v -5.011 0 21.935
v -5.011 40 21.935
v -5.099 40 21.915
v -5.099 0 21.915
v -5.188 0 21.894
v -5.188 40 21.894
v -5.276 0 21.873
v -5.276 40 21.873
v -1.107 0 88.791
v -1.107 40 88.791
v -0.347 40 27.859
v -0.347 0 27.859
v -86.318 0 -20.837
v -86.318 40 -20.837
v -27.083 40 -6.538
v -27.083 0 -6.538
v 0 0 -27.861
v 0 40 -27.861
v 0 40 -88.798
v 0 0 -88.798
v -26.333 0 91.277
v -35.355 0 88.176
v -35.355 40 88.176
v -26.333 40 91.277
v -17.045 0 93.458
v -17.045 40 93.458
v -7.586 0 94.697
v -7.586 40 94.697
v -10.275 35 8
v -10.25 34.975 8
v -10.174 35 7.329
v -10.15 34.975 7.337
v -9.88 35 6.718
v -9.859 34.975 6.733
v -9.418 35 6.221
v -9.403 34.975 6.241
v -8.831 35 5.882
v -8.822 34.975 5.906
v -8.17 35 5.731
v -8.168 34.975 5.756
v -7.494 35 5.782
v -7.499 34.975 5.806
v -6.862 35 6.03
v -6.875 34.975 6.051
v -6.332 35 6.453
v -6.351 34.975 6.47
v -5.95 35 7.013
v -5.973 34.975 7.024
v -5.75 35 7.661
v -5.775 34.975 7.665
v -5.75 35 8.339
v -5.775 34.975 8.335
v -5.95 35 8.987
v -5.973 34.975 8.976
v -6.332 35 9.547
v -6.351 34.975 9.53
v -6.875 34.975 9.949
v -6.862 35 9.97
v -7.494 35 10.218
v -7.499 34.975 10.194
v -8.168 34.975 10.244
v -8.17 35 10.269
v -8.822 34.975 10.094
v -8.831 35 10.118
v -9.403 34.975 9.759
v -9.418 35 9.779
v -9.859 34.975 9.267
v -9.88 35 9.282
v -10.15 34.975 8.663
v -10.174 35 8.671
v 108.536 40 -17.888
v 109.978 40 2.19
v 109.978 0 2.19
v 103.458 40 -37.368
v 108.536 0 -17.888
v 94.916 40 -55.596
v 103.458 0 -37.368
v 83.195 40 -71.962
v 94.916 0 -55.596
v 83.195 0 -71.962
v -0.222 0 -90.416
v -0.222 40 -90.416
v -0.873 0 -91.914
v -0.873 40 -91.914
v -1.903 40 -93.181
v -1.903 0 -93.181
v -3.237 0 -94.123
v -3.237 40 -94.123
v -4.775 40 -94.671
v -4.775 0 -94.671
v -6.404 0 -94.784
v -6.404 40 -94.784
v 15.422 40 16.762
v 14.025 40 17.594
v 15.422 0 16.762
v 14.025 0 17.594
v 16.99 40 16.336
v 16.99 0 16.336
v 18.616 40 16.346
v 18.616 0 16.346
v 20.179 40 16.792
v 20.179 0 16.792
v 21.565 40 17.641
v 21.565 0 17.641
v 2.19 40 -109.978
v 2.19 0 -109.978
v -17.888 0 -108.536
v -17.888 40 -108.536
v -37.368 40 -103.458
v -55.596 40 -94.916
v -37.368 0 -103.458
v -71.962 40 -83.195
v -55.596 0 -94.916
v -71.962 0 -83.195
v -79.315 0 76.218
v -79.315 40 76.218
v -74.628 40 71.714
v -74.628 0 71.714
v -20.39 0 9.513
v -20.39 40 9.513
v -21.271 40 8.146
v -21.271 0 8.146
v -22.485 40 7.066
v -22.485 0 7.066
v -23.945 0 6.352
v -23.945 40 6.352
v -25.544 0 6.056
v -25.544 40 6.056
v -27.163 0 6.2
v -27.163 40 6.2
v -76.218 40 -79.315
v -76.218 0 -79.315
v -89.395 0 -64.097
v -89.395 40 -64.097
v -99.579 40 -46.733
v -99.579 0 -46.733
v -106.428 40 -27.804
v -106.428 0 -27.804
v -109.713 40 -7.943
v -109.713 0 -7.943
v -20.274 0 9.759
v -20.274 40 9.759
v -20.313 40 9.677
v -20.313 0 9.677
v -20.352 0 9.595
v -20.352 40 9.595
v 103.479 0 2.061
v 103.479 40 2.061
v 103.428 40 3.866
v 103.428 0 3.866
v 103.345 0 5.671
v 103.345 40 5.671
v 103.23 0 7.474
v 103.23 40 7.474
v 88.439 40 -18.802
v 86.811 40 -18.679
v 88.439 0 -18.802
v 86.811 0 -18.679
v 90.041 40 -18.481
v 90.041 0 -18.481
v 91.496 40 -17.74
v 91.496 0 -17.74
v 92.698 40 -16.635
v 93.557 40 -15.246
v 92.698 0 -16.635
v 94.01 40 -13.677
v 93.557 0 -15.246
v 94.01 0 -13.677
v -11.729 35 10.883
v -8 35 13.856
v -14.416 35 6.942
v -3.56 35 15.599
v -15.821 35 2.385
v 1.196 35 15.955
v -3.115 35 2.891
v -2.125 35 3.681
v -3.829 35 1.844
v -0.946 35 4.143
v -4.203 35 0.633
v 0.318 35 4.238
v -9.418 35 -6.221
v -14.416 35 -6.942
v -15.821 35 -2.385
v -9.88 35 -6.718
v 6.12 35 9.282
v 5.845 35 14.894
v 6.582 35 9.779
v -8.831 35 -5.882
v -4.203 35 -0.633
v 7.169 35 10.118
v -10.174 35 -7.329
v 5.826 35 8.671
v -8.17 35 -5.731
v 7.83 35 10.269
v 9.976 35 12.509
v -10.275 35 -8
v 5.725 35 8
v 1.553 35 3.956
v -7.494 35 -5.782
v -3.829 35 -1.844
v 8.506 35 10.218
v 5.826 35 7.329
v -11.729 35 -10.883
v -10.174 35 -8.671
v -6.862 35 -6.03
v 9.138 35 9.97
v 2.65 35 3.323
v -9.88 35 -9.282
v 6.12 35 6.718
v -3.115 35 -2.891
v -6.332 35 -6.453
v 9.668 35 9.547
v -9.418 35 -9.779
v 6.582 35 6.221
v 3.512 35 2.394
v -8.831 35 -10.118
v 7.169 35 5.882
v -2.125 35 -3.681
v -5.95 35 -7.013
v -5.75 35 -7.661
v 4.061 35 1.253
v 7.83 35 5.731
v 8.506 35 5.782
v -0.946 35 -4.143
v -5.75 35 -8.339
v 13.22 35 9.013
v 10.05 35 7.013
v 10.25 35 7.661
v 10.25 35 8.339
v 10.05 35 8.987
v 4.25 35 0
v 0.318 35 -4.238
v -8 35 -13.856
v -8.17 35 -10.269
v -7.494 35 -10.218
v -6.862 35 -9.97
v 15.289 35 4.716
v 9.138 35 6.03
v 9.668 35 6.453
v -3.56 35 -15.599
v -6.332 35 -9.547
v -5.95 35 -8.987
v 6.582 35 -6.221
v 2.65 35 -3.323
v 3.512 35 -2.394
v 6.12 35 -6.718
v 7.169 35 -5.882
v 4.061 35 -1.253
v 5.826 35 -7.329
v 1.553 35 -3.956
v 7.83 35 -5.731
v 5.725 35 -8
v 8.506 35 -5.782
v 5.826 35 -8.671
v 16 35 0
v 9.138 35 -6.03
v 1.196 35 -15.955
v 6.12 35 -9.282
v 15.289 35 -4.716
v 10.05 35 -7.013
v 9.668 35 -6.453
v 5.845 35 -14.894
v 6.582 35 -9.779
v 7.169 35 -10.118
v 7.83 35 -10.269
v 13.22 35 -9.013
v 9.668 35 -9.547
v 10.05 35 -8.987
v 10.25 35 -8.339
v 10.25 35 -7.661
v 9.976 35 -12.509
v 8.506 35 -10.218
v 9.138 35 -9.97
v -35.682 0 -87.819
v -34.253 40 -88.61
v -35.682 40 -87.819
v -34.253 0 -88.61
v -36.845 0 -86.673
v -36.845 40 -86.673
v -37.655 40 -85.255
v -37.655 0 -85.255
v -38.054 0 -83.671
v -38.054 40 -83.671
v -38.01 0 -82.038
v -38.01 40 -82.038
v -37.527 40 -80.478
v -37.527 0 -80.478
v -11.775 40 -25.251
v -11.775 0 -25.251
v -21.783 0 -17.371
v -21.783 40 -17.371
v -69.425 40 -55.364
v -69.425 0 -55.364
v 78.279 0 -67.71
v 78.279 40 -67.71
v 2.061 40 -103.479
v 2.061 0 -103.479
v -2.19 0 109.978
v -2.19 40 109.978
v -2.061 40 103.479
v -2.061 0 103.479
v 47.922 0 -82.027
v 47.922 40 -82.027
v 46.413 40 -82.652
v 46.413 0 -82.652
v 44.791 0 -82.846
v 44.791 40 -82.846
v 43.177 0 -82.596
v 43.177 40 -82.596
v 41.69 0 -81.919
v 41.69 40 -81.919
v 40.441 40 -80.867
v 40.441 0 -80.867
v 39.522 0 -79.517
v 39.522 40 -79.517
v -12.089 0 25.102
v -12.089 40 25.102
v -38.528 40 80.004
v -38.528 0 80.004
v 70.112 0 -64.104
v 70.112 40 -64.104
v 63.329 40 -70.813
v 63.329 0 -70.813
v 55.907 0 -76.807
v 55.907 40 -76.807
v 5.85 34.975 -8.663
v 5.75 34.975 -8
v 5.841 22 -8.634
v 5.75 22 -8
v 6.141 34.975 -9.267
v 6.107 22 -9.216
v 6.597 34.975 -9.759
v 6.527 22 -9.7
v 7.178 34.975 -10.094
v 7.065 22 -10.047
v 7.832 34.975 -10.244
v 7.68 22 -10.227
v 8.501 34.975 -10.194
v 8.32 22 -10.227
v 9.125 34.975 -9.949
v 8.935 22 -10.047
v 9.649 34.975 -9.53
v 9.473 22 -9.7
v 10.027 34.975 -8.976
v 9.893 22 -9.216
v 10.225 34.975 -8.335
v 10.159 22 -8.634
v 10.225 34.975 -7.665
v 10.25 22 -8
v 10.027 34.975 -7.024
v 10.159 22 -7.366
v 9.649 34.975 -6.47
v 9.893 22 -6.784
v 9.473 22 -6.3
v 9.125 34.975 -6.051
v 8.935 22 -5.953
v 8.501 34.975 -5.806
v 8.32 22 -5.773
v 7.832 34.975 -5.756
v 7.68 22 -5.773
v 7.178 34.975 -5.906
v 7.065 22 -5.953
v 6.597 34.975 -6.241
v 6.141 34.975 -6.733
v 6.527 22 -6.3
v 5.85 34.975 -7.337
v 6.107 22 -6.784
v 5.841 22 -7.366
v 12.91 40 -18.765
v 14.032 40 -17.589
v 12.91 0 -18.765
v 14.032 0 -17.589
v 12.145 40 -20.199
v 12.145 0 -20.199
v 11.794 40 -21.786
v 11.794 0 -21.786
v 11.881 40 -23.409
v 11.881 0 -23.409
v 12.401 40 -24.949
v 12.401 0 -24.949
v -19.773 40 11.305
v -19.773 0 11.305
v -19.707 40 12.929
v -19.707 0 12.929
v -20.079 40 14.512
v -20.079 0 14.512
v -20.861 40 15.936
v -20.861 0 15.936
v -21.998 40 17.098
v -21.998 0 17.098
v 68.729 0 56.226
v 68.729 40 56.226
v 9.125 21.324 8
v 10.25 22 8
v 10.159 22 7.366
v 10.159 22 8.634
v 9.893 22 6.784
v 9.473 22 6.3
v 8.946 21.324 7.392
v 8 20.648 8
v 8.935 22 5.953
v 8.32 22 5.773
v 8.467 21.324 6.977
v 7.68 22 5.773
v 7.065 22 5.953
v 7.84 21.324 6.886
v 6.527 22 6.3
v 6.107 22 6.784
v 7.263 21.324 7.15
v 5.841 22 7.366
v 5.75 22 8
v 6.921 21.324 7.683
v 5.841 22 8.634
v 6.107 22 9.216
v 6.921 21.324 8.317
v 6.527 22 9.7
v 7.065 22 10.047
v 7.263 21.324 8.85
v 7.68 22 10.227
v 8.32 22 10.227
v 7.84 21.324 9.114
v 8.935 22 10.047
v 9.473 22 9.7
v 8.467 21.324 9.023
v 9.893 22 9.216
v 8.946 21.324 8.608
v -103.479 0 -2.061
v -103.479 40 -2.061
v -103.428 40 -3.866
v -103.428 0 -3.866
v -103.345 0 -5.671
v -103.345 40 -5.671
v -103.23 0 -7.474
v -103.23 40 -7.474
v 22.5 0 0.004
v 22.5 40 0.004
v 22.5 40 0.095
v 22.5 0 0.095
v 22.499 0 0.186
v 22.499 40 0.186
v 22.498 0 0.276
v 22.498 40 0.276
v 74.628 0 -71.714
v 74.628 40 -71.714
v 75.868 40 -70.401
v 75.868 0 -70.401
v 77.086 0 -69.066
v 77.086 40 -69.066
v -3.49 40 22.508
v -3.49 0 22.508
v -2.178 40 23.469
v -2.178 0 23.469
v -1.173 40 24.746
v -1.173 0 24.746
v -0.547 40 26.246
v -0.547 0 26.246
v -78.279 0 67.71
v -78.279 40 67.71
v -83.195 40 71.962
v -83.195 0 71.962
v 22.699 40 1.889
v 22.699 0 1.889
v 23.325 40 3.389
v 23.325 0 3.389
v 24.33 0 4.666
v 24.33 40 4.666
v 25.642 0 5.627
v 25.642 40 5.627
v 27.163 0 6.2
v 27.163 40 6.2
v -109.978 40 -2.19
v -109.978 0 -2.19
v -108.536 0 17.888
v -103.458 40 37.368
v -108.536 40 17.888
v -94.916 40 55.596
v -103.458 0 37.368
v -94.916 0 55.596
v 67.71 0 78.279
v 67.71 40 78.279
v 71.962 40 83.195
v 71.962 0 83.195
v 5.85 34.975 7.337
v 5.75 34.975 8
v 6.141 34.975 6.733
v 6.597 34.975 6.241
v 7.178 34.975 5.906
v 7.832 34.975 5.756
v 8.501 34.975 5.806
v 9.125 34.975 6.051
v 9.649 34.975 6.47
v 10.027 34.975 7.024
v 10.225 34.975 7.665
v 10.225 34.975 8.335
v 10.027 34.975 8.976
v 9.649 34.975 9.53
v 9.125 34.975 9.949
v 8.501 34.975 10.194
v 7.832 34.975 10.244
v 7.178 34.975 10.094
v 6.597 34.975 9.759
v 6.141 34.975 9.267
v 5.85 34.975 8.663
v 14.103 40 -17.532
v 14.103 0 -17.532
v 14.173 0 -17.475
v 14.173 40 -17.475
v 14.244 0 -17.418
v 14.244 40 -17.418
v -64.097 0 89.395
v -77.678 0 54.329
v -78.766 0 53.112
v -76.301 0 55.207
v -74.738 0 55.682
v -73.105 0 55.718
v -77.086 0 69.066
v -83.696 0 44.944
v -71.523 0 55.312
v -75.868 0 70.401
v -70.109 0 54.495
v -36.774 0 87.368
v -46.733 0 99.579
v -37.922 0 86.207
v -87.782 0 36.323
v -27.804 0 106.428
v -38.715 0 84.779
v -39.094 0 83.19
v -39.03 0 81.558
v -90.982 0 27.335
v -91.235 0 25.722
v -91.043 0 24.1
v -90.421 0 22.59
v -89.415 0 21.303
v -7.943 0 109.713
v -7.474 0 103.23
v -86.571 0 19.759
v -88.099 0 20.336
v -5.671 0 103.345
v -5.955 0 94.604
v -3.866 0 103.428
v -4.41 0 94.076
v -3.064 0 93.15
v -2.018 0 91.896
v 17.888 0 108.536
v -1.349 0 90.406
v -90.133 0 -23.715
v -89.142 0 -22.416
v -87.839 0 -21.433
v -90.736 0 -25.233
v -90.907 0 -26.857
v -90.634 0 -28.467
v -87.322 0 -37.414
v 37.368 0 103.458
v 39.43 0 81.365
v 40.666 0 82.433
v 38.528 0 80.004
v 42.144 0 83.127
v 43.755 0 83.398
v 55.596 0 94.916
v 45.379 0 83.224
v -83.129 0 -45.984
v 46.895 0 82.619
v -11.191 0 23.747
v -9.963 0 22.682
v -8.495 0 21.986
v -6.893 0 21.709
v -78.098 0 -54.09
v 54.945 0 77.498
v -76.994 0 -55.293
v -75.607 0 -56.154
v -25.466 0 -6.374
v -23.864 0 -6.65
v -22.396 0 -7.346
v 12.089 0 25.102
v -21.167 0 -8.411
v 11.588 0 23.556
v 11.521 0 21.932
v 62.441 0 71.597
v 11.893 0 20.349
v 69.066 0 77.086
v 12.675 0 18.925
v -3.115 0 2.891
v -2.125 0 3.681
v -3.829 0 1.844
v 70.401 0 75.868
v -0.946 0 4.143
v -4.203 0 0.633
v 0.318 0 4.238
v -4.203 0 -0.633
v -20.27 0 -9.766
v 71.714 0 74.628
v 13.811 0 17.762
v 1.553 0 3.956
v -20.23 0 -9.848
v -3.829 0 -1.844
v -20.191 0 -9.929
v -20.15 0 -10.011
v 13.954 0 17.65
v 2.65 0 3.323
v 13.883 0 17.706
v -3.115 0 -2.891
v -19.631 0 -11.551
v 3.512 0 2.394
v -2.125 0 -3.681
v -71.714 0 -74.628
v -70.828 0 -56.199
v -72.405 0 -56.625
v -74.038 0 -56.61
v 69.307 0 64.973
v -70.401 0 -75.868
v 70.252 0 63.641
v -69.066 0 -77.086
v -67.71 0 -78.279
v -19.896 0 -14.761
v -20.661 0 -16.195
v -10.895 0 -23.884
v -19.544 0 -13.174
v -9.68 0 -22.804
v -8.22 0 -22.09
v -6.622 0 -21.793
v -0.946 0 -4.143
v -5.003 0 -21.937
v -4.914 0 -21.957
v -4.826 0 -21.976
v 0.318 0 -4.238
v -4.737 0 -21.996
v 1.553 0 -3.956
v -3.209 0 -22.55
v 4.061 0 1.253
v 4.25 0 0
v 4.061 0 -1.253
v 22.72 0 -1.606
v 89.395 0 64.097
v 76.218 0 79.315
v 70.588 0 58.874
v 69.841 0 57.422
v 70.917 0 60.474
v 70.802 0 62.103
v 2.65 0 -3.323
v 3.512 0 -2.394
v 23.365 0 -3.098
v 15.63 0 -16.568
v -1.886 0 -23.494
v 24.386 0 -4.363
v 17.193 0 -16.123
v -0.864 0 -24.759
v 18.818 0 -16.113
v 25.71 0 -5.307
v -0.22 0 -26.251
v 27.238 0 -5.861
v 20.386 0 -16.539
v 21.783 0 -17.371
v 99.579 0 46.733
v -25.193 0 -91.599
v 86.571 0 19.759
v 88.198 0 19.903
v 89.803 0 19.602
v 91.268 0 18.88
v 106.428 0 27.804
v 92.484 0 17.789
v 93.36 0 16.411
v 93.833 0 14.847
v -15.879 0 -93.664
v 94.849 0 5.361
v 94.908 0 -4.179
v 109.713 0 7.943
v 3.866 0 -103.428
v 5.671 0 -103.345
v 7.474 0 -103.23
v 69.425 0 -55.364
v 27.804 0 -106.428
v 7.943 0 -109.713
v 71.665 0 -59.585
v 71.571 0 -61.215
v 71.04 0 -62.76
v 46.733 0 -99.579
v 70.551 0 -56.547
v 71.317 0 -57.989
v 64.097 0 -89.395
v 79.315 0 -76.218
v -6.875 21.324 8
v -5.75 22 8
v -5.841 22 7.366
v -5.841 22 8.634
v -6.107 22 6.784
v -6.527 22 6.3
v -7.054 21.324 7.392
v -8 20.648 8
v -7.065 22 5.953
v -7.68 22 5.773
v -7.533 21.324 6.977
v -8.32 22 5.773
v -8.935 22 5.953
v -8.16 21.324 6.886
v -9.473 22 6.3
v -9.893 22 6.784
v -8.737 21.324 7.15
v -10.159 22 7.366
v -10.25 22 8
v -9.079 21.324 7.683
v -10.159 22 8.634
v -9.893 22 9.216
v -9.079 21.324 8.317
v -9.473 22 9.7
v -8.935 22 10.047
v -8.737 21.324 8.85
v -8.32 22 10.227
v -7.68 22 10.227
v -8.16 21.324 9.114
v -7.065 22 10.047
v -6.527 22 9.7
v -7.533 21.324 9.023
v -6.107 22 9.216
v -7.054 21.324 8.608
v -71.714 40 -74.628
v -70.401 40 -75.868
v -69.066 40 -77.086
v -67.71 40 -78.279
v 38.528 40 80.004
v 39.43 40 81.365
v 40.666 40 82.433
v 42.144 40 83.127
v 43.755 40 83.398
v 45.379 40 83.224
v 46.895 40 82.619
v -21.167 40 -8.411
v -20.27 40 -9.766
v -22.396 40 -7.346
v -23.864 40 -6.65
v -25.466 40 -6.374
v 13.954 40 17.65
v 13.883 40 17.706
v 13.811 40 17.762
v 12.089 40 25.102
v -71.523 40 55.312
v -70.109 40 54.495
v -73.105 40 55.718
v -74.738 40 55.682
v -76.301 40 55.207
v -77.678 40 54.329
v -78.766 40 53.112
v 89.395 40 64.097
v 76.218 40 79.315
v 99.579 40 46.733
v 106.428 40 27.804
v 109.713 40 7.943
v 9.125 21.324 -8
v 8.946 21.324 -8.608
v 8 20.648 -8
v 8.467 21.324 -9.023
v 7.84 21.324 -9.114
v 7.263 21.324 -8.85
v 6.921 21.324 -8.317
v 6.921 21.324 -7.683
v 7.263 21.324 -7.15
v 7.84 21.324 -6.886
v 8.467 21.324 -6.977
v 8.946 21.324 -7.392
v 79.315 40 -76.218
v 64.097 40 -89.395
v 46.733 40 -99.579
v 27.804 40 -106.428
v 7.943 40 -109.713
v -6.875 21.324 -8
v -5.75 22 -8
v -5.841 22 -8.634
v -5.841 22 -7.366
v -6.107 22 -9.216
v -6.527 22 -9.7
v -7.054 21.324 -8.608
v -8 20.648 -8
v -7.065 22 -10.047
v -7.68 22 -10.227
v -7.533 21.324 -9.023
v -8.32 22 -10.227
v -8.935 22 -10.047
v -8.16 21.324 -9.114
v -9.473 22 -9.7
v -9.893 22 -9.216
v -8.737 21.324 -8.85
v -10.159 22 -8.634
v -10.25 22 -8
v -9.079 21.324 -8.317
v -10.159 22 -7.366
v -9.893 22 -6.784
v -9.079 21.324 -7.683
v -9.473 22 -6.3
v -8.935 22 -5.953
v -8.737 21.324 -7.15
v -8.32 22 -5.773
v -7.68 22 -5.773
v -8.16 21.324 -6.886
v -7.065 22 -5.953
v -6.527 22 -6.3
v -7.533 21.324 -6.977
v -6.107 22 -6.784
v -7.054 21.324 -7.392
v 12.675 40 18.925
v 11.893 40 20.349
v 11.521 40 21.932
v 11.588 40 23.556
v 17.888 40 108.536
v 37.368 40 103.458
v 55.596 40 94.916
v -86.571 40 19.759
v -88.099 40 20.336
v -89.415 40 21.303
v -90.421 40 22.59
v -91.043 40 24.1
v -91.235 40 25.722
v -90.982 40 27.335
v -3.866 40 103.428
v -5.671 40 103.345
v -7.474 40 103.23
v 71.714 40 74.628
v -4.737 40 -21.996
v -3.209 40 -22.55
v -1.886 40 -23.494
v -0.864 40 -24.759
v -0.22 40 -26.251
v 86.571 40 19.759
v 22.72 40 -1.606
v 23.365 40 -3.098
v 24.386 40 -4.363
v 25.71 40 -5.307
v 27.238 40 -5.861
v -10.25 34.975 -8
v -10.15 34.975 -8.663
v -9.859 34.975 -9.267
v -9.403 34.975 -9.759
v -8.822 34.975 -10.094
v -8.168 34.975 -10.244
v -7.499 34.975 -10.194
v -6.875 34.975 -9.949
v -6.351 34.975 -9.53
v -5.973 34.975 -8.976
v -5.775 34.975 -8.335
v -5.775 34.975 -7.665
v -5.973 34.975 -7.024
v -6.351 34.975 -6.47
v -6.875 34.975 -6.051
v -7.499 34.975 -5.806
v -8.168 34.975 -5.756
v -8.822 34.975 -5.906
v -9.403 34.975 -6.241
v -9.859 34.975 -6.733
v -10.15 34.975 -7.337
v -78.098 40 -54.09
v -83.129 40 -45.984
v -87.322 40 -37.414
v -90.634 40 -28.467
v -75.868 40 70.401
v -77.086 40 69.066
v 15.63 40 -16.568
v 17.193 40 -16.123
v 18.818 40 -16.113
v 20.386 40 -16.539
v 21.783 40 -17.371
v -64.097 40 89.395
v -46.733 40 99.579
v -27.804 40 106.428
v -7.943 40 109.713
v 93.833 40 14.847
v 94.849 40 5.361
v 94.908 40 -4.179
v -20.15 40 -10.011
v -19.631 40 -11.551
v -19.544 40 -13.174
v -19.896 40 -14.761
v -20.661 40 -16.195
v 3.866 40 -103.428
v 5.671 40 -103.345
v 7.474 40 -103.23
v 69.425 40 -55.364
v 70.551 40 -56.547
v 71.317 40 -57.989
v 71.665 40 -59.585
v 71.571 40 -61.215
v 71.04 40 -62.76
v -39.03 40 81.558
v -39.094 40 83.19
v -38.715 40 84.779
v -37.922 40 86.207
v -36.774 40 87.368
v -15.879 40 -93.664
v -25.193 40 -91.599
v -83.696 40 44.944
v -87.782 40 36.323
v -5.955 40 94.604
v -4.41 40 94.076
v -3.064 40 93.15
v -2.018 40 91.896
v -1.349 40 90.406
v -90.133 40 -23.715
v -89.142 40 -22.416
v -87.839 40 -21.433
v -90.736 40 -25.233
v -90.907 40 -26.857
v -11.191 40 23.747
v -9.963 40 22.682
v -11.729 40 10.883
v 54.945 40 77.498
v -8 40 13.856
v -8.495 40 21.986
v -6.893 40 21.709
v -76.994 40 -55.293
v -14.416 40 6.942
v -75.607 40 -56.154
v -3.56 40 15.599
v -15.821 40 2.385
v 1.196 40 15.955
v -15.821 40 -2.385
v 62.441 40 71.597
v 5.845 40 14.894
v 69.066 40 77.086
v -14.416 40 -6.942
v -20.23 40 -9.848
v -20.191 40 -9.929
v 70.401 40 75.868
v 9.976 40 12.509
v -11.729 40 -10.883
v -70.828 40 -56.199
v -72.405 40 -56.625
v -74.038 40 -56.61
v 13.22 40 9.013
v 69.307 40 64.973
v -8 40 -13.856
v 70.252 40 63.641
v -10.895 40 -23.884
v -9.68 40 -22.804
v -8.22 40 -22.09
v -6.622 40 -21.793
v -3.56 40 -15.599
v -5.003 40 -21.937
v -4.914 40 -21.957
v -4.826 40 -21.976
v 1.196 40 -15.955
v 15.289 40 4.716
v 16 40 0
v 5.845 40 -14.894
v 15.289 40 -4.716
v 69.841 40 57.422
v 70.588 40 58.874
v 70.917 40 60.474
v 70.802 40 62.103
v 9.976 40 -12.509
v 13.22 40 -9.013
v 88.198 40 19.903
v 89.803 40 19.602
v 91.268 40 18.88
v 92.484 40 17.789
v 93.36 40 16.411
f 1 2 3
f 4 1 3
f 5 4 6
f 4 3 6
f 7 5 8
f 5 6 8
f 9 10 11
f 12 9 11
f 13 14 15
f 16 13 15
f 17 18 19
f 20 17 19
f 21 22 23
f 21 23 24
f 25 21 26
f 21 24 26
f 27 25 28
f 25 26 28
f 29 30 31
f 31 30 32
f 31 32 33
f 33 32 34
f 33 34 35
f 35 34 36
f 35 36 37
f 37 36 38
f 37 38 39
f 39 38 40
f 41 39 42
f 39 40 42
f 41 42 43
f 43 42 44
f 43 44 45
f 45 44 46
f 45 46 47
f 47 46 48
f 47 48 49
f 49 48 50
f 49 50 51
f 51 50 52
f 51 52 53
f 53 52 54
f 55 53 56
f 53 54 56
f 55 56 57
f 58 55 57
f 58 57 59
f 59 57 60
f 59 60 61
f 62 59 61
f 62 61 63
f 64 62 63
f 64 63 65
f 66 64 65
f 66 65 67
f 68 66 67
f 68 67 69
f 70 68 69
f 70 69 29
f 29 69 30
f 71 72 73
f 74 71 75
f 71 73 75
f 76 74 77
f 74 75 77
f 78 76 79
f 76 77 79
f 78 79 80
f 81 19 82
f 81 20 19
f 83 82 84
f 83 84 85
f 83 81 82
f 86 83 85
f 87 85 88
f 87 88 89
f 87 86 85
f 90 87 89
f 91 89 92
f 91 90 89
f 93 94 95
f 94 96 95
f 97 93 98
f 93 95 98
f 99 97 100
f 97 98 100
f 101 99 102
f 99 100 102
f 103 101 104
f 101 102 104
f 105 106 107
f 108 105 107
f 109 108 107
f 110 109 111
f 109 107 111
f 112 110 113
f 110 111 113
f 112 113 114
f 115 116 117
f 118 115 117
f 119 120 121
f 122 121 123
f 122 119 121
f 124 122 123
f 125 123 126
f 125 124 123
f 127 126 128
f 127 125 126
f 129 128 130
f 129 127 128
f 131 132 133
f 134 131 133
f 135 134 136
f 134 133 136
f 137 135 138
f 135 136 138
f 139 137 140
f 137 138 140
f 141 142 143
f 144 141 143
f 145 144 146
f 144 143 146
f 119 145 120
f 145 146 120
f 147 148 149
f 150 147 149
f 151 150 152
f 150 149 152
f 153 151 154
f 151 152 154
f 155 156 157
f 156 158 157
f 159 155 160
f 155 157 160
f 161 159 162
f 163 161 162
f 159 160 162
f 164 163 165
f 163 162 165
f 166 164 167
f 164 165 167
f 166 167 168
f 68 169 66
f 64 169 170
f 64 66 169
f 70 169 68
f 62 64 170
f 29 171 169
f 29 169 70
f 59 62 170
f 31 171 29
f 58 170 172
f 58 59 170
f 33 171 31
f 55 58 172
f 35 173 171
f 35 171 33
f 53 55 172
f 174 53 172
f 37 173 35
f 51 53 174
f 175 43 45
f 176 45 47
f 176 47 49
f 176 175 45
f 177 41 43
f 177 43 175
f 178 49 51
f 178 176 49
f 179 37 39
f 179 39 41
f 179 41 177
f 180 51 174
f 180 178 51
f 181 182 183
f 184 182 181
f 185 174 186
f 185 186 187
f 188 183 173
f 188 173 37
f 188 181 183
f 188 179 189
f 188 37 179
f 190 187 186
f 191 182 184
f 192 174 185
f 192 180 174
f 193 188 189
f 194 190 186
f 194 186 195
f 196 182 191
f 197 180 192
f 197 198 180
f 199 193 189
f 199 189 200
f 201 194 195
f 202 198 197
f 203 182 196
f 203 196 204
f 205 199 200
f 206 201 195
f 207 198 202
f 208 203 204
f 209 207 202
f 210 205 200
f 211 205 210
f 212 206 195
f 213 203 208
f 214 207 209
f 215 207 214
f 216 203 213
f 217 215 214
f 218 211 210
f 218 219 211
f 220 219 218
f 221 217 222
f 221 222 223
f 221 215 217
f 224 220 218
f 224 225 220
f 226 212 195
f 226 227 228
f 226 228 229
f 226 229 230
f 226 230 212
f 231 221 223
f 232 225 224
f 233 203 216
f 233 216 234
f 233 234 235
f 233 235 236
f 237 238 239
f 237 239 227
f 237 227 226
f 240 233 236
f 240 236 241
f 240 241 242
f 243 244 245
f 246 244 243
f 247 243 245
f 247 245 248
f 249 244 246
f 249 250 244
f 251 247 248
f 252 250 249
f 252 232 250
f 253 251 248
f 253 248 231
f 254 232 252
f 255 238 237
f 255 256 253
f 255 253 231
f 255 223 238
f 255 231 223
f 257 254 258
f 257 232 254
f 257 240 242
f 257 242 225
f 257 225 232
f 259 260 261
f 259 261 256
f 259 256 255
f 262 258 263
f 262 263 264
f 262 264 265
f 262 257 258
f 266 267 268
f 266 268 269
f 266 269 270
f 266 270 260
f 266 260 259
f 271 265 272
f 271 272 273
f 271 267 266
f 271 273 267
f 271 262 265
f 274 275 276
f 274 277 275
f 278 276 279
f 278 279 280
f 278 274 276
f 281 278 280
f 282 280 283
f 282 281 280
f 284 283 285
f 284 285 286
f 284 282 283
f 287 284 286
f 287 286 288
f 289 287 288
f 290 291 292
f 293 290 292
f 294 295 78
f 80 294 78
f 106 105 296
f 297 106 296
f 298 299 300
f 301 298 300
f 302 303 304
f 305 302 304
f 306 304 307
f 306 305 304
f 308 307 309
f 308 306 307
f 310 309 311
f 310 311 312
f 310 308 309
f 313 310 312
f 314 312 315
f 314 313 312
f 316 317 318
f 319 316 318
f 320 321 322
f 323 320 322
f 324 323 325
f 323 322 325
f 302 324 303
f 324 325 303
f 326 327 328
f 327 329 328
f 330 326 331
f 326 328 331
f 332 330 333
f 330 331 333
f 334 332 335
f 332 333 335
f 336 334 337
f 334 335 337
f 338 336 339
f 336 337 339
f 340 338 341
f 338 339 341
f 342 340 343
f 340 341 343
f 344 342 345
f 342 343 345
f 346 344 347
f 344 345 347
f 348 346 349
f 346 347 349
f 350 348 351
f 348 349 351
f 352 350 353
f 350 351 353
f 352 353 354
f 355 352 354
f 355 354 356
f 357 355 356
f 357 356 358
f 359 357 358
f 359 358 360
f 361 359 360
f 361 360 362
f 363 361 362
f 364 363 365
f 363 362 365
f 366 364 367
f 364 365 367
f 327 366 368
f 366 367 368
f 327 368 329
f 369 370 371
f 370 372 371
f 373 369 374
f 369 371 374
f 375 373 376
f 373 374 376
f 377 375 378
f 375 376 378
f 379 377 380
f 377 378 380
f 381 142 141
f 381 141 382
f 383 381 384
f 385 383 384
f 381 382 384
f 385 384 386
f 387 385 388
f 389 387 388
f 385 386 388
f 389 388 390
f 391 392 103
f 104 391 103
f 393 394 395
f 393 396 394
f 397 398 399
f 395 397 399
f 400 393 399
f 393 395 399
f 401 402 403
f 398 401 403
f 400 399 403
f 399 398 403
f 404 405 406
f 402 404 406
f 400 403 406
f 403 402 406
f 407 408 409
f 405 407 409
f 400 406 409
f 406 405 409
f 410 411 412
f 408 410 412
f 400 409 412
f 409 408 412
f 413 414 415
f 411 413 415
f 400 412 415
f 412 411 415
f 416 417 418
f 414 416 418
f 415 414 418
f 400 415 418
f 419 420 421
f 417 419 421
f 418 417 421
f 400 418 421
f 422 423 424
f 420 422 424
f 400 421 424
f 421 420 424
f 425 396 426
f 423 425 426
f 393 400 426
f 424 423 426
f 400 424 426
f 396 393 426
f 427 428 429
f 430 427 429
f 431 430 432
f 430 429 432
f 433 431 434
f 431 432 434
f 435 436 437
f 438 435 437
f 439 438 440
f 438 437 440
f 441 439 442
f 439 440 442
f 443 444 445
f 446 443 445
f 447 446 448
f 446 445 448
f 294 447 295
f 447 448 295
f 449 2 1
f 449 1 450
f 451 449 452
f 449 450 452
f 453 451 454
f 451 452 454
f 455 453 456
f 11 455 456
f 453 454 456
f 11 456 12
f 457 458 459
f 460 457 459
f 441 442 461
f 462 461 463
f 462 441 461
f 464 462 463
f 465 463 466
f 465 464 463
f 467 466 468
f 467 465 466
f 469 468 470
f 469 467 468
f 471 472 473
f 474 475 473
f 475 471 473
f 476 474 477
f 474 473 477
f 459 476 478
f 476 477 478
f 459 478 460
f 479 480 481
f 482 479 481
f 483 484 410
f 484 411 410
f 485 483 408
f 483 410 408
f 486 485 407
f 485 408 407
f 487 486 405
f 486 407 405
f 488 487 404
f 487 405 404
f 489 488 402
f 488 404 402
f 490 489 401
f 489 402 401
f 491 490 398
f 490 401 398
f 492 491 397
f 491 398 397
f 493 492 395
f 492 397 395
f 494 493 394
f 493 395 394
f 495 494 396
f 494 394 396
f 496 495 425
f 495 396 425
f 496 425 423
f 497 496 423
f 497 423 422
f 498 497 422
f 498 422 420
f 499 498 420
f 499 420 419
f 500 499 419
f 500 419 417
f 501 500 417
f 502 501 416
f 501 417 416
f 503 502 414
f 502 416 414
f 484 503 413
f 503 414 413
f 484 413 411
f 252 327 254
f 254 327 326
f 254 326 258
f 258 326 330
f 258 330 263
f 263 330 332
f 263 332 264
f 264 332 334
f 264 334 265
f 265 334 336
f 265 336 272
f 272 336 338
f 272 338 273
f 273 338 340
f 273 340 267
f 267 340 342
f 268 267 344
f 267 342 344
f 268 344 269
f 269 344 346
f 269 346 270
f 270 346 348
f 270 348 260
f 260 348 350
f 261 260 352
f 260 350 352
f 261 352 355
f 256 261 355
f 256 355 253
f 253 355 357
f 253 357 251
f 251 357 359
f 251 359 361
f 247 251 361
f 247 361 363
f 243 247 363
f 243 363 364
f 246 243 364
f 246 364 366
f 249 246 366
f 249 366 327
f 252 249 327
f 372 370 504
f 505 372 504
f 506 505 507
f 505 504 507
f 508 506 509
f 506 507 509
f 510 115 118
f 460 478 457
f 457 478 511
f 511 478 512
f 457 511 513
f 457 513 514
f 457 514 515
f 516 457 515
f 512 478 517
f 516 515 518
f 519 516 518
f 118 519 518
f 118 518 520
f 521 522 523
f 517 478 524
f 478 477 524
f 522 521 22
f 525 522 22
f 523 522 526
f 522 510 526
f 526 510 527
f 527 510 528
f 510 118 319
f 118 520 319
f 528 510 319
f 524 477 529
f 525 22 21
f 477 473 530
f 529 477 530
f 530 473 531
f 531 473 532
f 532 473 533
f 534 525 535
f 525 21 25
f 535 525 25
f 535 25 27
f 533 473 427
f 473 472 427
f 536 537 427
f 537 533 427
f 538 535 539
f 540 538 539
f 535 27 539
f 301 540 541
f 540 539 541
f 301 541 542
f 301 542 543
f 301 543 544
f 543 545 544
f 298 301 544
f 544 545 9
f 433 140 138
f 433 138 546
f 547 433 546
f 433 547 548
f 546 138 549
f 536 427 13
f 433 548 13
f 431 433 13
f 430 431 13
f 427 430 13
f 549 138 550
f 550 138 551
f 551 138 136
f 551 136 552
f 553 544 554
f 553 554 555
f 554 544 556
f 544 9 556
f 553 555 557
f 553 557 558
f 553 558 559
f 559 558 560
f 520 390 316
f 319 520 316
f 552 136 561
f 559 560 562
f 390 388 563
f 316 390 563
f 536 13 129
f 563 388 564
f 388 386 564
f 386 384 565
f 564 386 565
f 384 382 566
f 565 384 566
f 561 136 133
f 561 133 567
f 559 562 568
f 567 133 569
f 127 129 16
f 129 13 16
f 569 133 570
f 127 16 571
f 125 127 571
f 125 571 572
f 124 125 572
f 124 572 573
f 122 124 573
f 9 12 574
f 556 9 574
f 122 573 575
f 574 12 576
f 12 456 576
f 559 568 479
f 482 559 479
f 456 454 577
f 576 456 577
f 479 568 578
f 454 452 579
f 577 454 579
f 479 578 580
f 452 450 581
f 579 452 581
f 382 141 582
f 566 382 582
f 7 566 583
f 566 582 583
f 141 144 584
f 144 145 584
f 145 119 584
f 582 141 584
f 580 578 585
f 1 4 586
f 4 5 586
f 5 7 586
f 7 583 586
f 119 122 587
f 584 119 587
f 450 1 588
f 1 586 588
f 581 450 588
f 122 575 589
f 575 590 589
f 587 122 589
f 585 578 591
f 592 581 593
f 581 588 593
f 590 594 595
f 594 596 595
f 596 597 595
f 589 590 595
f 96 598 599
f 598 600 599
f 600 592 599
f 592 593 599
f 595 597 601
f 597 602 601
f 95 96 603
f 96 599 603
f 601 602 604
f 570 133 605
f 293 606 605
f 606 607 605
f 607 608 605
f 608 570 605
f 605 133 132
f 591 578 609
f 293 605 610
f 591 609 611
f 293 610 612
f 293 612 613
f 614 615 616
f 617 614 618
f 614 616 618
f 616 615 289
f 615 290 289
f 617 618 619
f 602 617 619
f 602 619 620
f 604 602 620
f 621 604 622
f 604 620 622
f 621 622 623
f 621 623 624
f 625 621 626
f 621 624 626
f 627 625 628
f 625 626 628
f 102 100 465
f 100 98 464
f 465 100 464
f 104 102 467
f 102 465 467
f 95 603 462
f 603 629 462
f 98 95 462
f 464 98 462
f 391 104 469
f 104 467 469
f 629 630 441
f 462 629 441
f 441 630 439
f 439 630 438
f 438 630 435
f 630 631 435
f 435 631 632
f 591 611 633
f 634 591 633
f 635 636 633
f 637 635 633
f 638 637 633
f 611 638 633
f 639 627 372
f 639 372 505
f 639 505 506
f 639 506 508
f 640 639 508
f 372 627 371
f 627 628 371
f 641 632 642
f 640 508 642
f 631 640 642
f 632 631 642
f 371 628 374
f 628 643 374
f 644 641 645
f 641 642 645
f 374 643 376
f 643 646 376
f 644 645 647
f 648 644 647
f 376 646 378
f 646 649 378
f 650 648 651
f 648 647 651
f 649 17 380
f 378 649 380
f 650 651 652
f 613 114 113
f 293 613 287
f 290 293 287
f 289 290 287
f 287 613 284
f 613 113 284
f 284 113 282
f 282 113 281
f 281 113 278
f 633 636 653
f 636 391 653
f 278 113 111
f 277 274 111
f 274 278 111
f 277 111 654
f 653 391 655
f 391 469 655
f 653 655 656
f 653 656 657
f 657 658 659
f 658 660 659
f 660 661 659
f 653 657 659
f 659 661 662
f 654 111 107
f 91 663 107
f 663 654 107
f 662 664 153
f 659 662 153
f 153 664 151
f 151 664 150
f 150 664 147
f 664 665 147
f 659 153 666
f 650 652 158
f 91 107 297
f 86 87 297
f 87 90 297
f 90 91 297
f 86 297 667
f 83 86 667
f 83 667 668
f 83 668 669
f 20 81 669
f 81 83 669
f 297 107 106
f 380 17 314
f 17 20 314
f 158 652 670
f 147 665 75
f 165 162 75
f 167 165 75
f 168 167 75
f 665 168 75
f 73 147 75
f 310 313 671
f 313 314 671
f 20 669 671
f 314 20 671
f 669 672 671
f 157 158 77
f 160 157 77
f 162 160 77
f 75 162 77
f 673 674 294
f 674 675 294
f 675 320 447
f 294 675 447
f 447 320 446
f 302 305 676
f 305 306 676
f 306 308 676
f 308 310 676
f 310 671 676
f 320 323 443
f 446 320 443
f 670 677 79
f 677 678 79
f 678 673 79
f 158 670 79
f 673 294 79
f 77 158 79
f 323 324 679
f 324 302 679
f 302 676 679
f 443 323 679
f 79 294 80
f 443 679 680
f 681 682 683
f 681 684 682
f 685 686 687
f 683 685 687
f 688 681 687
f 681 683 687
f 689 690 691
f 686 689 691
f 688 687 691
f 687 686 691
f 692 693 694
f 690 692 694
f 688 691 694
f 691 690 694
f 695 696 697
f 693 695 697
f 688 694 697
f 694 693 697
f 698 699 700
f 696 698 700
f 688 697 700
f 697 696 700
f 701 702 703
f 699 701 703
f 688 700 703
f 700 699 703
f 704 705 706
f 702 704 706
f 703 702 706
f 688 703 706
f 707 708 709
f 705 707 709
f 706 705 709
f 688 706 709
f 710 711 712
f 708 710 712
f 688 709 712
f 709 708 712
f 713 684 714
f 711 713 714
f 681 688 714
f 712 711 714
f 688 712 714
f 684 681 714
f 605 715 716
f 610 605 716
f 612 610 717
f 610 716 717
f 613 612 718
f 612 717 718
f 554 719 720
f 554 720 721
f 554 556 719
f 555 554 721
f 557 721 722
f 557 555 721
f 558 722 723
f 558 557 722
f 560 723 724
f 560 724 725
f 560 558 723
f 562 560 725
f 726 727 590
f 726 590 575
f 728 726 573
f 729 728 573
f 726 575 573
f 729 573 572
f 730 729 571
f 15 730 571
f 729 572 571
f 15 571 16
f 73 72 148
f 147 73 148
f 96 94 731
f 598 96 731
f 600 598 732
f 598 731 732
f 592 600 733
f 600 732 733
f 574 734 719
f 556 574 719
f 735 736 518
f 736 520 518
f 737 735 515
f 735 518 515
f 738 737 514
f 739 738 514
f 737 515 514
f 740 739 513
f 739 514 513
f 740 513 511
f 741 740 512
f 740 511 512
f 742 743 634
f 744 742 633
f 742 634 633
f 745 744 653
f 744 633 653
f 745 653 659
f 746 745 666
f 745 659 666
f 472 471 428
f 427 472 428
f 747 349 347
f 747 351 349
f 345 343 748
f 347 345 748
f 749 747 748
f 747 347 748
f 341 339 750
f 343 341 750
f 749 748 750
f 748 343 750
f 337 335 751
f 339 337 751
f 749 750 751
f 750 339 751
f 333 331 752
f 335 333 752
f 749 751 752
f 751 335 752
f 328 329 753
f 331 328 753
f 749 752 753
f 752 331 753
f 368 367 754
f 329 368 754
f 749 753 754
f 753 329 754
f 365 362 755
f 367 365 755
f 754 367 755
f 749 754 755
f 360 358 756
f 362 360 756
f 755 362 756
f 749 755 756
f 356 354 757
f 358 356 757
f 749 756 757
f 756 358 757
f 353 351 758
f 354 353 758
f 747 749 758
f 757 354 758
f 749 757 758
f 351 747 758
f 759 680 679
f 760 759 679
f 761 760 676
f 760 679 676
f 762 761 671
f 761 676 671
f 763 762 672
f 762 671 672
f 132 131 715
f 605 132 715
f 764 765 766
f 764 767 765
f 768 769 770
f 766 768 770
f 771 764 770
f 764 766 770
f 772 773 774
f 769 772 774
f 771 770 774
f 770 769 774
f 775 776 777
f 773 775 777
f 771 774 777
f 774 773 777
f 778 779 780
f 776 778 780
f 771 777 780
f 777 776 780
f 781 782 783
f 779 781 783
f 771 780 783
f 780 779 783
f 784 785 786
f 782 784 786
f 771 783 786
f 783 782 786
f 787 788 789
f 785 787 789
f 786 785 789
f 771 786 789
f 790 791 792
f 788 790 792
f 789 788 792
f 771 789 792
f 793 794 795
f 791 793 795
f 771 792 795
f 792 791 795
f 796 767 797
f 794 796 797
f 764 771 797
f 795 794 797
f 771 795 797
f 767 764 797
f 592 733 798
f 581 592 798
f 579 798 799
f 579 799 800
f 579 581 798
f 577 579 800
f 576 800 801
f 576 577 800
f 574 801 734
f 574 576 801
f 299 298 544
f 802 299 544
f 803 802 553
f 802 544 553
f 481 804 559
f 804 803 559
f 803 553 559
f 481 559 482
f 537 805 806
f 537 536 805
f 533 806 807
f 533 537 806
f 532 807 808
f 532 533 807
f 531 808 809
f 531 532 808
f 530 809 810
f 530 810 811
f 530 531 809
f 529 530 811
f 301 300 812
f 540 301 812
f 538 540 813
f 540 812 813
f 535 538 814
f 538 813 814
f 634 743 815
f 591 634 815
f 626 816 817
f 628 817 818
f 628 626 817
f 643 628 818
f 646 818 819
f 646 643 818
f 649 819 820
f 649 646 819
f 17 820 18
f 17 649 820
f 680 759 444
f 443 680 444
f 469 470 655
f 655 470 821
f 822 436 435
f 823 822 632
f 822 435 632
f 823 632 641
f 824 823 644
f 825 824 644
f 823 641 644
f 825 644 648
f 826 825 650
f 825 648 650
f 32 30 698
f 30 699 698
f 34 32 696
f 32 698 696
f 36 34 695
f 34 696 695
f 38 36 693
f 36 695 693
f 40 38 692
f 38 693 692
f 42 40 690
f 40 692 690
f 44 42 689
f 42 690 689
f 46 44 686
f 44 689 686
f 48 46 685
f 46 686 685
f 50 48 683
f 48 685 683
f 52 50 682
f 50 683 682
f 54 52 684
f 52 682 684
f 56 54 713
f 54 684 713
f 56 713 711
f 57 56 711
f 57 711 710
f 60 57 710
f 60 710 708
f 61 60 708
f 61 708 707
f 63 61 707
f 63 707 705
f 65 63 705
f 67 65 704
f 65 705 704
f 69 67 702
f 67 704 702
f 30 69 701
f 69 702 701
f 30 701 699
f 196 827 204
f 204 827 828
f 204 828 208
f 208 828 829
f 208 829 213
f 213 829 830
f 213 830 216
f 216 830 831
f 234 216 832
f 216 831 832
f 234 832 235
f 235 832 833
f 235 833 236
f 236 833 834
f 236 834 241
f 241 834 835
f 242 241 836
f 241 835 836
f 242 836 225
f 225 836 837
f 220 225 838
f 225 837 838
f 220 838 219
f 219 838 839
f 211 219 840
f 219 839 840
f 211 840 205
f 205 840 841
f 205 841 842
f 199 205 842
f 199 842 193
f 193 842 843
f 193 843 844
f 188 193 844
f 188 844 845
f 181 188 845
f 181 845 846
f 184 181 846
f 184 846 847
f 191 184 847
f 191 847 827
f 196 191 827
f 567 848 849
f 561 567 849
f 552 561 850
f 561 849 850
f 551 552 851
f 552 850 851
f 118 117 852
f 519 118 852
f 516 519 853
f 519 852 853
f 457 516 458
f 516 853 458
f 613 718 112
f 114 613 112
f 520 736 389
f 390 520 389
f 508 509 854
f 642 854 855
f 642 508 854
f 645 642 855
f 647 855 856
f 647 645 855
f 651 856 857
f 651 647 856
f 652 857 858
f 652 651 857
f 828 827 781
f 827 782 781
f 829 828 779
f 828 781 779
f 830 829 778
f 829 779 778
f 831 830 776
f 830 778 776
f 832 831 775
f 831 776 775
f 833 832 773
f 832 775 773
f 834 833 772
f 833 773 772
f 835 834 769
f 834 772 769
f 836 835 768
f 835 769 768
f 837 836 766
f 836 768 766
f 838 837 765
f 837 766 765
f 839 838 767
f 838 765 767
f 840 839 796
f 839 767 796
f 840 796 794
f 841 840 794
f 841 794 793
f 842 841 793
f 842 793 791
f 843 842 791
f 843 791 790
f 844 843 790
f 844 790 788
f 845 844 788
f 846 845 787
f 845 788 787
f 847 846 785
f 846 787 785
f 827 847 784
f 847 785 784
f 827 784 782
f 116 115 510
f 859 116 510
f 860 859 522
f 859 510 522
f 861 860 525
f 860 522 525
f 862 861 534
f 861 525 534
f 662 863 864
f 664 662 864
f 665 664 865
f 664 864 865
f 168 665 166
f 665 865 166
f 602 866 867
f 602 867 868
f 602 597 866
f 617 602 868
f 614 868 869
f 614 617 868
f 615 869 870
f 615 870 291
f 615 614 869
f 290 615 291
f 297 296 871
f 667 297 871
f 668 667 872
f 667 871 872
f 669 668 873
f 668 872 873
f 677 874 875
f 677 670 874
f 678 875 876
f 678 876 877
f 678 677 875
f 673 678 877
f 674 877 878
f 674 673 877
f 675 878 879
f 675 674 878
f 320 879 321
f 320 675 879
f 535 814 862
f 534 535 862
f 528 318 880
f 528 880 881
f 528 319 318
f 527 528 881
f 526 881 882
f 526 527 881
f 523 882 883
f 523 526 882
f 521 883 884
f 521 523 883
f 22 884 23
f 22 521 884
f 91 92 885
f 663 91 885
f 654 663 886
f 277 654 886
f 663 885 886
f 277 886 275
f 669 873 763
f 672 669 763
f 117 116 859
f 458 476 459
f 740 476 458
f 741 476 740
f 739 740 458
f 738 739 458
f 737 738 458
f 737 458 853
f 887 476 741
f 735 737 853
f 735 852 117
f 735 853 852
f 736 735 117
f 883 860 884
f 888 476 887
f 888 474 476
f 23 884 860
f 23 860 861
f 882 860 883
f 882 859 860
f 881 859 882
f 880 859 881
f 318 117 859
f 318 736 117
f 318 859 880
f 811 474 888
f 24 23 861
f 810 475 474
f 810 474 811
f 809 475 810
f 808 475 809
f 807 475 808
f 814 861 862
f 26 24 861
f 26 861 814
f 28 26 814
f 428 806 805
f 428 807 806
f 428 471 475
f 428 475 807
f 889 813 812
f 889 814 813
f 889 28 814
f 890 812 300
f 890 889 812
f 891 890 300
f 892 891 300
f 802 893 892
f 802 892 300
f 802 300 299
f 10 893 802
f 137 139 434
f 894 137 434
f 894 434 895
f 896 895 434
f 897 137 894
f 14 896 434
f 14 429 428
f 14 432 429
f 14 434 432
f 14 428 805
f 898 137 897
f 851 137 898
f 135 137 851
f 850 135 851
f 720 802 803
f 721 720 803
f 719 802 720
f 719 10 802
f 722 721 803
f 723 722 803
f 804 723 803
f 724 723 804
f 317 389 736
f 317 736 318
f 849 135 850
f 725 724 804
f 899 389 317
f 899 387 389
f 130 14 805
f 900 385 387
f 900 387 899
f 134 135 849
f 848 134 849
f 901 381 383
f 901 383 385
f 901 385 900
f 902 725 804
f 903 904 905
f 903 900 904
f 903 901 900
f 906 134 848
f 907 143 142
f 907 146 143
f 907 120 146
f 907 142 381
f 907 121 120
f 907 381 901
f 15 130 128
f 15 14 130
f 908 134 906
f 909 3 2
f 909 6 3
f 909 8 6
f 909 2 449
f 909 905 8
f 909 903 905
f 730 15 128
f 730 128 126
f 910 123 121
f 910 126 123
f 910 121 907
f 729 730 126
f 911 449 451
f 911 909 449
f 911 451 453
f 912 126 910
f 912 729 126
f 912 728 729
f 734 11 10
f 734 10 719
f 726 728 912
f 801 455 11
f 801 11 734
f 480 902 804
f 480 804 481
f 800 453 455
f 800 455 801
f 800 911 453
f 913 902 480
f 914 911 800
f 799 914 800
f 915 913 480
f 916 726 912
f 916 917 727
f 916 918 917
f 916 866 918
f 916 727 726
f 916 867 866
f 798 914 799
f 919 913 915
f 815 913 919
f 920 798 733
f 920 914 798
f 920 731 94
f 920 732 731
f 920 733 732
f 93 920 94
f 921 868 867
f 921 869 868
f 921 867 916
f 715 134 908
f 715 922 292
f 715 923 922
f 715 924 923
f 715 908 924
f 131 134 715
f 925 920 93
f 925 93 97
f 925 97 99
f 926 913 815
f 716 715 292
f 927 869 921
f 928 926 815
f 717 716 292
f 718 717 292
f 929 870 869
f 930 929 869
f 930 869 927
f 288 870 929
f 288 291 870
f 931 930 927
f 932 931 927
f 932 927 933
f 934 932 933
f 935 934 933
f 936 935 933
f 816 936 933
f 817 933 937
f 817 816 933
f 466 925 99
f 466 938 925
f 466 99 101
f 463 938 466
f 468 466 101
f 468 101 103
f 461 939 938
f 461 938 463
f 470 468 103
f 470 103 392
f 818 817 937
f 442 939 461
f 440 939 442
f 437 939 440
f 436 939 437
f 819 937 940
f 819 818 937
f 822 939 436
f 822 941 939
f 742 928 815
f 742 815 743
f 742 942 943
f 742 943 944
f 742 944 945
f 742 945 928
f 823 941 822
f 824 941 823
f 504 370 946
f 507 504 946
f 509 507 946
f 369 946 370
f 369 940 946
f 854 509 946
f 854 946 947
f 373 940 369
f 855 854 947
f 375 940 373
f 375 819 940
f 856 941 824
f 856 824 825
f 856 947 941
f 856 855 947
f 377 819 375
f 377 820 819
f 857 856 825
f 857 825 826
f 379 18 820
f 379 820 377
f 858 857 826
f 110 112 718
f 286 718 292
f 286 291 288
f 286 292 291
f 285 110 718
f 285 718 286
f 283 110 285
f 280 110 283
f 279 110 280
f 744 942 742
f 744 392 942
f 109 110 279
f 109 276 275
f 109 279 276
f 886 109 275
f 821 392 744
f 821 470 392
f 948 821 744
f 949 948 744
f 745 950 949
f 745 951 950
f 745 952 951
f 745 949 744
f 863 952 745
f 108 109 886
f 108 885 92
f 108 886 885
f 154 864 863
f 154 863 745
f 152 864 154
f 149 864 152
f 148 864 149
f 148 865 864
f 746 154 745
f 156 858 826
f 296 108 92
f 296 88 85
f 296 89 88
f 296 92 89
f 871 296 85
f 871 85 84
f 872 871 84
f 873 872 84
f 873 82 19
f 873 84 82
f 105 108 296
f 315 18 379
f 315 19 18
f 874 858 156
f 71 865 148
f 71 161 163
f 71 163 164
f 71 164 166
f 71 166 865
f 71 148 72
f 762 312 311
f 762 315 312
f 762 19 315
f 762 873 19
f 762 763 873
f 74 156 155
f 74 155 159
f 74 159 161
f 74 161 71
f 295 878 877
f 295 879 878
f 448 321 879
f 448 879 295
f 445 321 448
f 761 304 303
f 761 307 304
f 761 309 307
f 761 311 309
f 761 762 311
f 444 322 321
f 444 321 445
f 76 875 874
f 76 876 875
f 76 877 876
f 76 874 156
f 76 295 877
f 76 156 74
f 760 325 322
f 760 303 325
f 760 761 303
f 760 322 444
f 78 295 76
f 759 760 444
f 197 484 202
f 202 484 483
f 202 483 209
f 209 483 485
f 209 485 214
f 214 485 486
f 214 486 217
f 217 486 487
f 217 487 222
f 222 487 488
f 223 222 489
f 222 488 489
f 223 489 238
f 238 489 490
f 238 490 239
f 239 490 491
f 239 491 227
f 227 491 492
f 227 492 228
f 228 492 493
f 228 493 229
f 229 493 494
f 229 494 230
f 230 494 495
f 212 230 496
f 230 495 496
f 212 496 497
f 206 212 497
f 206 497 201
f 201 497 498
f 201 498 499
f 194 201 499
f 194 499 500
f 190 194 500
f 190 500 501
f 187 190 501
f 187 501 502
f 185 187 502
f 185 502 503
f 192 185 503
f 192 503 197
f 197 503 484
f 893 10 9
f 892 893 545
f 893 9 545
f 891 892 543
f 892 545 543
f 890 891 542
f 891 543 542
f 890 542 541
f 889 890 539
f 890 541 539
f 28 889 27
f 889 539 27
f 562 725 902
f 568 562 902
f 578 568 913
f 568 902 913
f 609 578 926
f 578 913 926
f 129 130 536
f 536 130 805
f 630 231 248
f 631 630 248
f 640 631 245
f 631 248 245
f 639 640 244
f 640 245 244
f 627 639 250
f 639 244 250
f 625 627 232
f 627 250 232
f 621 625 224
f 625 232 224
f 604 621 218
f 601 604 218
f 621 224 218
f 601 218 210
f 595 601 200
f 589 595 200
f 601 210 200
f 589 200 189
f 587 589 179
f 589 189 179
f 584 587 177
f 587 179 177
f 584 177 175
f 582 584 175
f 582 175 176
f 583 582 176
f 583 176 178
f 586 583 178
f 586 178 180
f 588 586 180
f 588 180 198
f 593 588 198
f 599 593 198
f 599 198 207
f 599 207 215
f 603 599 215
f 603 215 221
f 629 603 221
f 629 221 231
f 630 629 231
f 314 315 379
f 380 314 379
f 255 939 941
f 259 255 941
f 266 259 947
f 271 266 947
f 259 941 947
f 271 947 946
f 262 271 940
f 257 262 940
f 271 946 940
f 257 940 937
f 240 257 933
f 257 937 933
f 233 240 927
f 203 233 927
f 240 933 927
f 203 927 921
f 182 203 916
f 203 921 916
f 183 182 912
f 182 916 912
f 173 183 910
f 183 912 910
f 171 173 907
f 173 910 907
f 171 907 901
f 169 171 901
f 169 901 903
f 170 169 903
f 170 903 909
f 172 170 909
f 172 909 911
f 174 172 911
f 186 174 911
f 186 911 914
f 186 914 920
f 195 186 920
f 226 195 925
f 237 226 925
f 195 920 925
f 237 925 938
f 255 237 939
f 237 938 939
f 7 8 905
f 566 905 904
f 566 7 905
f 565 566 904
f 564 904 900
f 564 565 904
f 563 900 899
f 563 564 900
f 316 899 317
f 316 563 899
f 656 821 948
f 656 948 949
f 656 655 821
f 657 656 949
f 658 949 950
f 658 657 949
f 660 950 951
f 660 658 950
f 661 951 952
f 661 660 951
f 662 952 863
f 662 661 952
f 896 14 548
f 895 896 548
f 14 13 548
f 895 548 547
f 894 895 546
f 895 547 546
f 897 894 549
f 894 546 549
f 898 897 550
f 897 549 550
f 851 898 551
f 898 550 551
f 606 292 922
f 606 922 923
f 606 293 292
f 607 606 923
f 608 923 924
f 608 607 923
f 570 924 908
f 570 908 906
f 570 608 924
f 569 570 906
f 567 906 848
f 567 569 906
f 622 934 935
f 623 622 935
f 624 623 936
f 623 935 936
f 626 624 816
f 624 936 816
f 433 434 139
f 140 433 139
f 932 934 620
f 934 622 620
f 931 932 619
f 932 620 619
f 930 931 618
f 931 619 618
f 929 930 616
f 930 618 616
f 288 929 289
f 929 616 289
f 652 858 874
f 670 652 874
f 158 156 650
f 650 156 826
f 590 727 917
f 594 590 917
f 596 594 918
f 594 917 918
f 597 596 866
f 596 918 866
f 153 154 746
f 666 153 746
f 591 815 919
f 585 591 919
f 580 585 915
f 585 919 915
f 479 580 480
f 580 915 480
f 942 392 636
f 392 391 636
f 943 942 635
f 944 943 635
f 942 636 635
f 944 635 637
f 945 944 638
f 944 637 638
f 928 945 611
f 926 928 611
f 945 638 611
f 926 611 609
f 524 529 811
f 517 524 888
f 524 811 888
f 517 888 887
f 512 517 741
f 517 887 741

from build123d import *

# Parameters (mm, degrees)
SKETCH1_R                      = 110
BOSS_EXTRUDE1_DEPTH            = 40
CUT_EXTRUDE1_DEPTH             = 40
FILLET1_R                      = 6
SKETCH3_R                      = 4.25
CUT_EXTRUDE2_DEPTH             = 40
CIRPATTERN1_COUNT              = 7
FILLET1_OF_CIRPATTERN1_R       = 6
SKETCH4_R                      = 16
CUT_EXTRUDE3_DEPTH             = 5
M4_CLEARANCE_HOLE1_D           = 4.5
M4_CLEARANCE_HOLE1_DEPTH       = 13
M4_CLEARANCE_HOLE1_CSINK_D     = 4.55
M4_CLEARANCE_HOLE1_CSINK_ANGLE = 90
M4_CLEARANCE_HOLE1_TIP         = 1.351936393
CUT_EXTRUDE4_DEPTH             = 41
CIRPATTERN2_COUNT              = 8


with BuildPart() as part:
    # Sketch1 → Boss-Extrude1 (new body)
    with BuildSketch(Plane(origin=(0, 0, 0), x_dir=(1, 0, 0), z_dir=(0, 1, 0))):
        Circle(SKETCH1_R)
    extrude(amount=BOSS_EXTRUDE1_DEPTH)

    # Sketch2 → Cut-Extrude1 (cut)
    with BuildSketch(Plane(origin=(0, 40, 0), x_dir=(1, 0, 0), z_dir=(0, 1, 0))):
        with BuildLine():
            ThreePointArc((-9.508910889, 20.391925208), (-4.869891314, 21.96666016), (0, 22.5))
            Line((0, 22.5), (0, 95))
            ThreePointArc((0, 95), (-20.561763324, 92.748120676), (-40.148734865, 86.099239768))
            Line((-40.148734865, 86.099239768), (-9.508910889, 20.391925208))
        make_face()
    cut_extrude1 = extrude(amount=-CUT_EXTRUDE1_DEPTH, mode=Mode.SUBTRACT)

    # Fillet1
    fillet1_edges = [part.edges().sort_by_distance(p)[0] for p in [
        (0, 20, -22.5),
        (-9.508910889, 20, -20.391925208),
        (-40.148734865, 20, -86.099239768),
        (0, 20, -95),
    ]]
    fillet(fillet1_edges, radius=FILLET1_R)

    # Sketch3 → Cut-Extrude2 (cut)
    with BuildSketch(Plane(origin=(0, 40, 0), x_dir=(1, 0, 0), z_dir=(0, 1, 0))):
        Circle(SKETCH3_R)
    extrude(amount=-CUT_EXTRUDE2_DEPTH, mode=Mode.SUBTRACT)

    # CirPattern1: Cut-Extrude1 ×7 about axis
    cirpattern1_axis = Axis((0, 0, 0), (0, 1, 0))
    for i in range(1, CIRPATTERN1_COUNT):
        add(cut_extrude1.rotate(cirpattern1_axis, i * 360 / CIRPATTERN1_COUNT), mode=Mode.SUBTRACT)

    # Fillet1 of CirPattern1
    fillet1_of_cirpattern1_edges = [part.edges().sort_by_distance(p)[0] for p in [
        (-17.591208356, 20, -14.028520542),
        (-21.871758082, 20, -5.279791511),
        (-92.347423014, 20, -22.292453044),
        (-74.273990834, 20, -59.231531177),
        (-21.935878024, 20, 5.006721014),
        (-17.764725337, 20, 13.808132883),
        (-75.006618089, 20, 58.301005505),
        (-92.618151657, 20, 21.139488726),
        (-9.76238413, 20, 20.271799528),
        (-0.280492078, 20, 22.498251581),
        (-1.184299887, 20, 94.992617786),
        (-41.218955216, 20, 85.592042451),
        (9.76238413, 20, 20.271799528),
        (17.414957436, 20, 14.246727958),
        (73.529820285, 20, 60.152851377),
        (41.218955216, 20, 85.592042451),
        (21.935878024, 20, 5.006721014),
        (21.996588801, 20, -4.732872398),
        (92.874486047, 20, -19.983239013),
        (92.618151657, 20, 21.139488726),
        (17.591208356, 20, -14.028520542),
        (10.01434015, 20, -20.148523305),
        (42.282769521, 20, -85.071542842),
        (74.273990834, 20, -59.231531177),
    ]]
    fillet(fillet1_of_cirpattern1_edges, radius=FILLET1_OF_CIRPATTERN1_R)

    # Sketch4 → Cut-Extrude3 (cut)
    with BuildSketch(Plane(origin=(0, 40, 0), x_dir=(1, 0, 0), z_dir=(0, 1, 0))):
        Circle(SKETCH4_R)
    extrude(amount=-CUT_EXTRUDE3_DEPTH, mode=Mode.SUBTRACT)

    # M4 Clearance Hole1
    with Locations(Plane(origin=(0, 35, 0), x_dir=(1, 0, 0), z_dir=(0, 1, 0))):
        with Locations((8, 8), (-8, 8), (-8, -8), (8, -8)):
            CounterSinkHole(M4_CLEARANCE_HOLE1_D / 2, M4_CLEARANCE_HOLE1_CSINK_D / 2, depth=M4_CLEARANCE_HOLE1_DEPTH, counter_sink_angle=M4_CLEARANCE_HOLE1_CSINK_ANGLE)
            with Locations((0, 0, -(M4_CLEARANCE_HOLE1_DEPTH + M4_CLEARANCE_HOLE1_TIP / 2))):  # 118° drill point
                Cone(0, M4_CLEARANCE_HOLE1_D / 2, M4_CLEARANCE_HOLE1_TIP, mode=Mode.SUBTRACT)

    # Sketch10 → Cut-Extrude4 (cut, through all)
    with BuildSketch(Plane(origin=(0, 40, 0), x_dir=(1, 0, 0), z_dir=(0, 1, 0))):
        with BuildLine():
            ThreePointArc((2.060734507, 103.479482862), (4.768805418, 103.390079287), (7.473608029, 103.229817316))
            Line((7.473608029, 103.229817316), (7.942965055, 109.712849321))
            ThreePointArc((7.942965055, 109.712849321), (5.068295614, 109.883176053), (2.190152616, 109.978194346))
            Line((2.190152616, 109.978194346), (2.060734507, 103.479482862))
        make_face()
    cut_extrude4 = extrude(amount=-CUT_EXTRUDE4_DEPTH, mode=Mode.SUBTRACT)

    # CirPattern2: Cut-Extrude4 ×8 about axis
    cirpattern2_axis = Axis((0, 0, 0), (0, 1, 0))
    for i in range(1, CIRPATTERN2_COUNT):
        add(cut_extrude4.rotate(cirpattern2_axis, i * 360 / CIRPATTERN2_COUNT), mode=Mode.SUBTRACT)


solid = part.part
